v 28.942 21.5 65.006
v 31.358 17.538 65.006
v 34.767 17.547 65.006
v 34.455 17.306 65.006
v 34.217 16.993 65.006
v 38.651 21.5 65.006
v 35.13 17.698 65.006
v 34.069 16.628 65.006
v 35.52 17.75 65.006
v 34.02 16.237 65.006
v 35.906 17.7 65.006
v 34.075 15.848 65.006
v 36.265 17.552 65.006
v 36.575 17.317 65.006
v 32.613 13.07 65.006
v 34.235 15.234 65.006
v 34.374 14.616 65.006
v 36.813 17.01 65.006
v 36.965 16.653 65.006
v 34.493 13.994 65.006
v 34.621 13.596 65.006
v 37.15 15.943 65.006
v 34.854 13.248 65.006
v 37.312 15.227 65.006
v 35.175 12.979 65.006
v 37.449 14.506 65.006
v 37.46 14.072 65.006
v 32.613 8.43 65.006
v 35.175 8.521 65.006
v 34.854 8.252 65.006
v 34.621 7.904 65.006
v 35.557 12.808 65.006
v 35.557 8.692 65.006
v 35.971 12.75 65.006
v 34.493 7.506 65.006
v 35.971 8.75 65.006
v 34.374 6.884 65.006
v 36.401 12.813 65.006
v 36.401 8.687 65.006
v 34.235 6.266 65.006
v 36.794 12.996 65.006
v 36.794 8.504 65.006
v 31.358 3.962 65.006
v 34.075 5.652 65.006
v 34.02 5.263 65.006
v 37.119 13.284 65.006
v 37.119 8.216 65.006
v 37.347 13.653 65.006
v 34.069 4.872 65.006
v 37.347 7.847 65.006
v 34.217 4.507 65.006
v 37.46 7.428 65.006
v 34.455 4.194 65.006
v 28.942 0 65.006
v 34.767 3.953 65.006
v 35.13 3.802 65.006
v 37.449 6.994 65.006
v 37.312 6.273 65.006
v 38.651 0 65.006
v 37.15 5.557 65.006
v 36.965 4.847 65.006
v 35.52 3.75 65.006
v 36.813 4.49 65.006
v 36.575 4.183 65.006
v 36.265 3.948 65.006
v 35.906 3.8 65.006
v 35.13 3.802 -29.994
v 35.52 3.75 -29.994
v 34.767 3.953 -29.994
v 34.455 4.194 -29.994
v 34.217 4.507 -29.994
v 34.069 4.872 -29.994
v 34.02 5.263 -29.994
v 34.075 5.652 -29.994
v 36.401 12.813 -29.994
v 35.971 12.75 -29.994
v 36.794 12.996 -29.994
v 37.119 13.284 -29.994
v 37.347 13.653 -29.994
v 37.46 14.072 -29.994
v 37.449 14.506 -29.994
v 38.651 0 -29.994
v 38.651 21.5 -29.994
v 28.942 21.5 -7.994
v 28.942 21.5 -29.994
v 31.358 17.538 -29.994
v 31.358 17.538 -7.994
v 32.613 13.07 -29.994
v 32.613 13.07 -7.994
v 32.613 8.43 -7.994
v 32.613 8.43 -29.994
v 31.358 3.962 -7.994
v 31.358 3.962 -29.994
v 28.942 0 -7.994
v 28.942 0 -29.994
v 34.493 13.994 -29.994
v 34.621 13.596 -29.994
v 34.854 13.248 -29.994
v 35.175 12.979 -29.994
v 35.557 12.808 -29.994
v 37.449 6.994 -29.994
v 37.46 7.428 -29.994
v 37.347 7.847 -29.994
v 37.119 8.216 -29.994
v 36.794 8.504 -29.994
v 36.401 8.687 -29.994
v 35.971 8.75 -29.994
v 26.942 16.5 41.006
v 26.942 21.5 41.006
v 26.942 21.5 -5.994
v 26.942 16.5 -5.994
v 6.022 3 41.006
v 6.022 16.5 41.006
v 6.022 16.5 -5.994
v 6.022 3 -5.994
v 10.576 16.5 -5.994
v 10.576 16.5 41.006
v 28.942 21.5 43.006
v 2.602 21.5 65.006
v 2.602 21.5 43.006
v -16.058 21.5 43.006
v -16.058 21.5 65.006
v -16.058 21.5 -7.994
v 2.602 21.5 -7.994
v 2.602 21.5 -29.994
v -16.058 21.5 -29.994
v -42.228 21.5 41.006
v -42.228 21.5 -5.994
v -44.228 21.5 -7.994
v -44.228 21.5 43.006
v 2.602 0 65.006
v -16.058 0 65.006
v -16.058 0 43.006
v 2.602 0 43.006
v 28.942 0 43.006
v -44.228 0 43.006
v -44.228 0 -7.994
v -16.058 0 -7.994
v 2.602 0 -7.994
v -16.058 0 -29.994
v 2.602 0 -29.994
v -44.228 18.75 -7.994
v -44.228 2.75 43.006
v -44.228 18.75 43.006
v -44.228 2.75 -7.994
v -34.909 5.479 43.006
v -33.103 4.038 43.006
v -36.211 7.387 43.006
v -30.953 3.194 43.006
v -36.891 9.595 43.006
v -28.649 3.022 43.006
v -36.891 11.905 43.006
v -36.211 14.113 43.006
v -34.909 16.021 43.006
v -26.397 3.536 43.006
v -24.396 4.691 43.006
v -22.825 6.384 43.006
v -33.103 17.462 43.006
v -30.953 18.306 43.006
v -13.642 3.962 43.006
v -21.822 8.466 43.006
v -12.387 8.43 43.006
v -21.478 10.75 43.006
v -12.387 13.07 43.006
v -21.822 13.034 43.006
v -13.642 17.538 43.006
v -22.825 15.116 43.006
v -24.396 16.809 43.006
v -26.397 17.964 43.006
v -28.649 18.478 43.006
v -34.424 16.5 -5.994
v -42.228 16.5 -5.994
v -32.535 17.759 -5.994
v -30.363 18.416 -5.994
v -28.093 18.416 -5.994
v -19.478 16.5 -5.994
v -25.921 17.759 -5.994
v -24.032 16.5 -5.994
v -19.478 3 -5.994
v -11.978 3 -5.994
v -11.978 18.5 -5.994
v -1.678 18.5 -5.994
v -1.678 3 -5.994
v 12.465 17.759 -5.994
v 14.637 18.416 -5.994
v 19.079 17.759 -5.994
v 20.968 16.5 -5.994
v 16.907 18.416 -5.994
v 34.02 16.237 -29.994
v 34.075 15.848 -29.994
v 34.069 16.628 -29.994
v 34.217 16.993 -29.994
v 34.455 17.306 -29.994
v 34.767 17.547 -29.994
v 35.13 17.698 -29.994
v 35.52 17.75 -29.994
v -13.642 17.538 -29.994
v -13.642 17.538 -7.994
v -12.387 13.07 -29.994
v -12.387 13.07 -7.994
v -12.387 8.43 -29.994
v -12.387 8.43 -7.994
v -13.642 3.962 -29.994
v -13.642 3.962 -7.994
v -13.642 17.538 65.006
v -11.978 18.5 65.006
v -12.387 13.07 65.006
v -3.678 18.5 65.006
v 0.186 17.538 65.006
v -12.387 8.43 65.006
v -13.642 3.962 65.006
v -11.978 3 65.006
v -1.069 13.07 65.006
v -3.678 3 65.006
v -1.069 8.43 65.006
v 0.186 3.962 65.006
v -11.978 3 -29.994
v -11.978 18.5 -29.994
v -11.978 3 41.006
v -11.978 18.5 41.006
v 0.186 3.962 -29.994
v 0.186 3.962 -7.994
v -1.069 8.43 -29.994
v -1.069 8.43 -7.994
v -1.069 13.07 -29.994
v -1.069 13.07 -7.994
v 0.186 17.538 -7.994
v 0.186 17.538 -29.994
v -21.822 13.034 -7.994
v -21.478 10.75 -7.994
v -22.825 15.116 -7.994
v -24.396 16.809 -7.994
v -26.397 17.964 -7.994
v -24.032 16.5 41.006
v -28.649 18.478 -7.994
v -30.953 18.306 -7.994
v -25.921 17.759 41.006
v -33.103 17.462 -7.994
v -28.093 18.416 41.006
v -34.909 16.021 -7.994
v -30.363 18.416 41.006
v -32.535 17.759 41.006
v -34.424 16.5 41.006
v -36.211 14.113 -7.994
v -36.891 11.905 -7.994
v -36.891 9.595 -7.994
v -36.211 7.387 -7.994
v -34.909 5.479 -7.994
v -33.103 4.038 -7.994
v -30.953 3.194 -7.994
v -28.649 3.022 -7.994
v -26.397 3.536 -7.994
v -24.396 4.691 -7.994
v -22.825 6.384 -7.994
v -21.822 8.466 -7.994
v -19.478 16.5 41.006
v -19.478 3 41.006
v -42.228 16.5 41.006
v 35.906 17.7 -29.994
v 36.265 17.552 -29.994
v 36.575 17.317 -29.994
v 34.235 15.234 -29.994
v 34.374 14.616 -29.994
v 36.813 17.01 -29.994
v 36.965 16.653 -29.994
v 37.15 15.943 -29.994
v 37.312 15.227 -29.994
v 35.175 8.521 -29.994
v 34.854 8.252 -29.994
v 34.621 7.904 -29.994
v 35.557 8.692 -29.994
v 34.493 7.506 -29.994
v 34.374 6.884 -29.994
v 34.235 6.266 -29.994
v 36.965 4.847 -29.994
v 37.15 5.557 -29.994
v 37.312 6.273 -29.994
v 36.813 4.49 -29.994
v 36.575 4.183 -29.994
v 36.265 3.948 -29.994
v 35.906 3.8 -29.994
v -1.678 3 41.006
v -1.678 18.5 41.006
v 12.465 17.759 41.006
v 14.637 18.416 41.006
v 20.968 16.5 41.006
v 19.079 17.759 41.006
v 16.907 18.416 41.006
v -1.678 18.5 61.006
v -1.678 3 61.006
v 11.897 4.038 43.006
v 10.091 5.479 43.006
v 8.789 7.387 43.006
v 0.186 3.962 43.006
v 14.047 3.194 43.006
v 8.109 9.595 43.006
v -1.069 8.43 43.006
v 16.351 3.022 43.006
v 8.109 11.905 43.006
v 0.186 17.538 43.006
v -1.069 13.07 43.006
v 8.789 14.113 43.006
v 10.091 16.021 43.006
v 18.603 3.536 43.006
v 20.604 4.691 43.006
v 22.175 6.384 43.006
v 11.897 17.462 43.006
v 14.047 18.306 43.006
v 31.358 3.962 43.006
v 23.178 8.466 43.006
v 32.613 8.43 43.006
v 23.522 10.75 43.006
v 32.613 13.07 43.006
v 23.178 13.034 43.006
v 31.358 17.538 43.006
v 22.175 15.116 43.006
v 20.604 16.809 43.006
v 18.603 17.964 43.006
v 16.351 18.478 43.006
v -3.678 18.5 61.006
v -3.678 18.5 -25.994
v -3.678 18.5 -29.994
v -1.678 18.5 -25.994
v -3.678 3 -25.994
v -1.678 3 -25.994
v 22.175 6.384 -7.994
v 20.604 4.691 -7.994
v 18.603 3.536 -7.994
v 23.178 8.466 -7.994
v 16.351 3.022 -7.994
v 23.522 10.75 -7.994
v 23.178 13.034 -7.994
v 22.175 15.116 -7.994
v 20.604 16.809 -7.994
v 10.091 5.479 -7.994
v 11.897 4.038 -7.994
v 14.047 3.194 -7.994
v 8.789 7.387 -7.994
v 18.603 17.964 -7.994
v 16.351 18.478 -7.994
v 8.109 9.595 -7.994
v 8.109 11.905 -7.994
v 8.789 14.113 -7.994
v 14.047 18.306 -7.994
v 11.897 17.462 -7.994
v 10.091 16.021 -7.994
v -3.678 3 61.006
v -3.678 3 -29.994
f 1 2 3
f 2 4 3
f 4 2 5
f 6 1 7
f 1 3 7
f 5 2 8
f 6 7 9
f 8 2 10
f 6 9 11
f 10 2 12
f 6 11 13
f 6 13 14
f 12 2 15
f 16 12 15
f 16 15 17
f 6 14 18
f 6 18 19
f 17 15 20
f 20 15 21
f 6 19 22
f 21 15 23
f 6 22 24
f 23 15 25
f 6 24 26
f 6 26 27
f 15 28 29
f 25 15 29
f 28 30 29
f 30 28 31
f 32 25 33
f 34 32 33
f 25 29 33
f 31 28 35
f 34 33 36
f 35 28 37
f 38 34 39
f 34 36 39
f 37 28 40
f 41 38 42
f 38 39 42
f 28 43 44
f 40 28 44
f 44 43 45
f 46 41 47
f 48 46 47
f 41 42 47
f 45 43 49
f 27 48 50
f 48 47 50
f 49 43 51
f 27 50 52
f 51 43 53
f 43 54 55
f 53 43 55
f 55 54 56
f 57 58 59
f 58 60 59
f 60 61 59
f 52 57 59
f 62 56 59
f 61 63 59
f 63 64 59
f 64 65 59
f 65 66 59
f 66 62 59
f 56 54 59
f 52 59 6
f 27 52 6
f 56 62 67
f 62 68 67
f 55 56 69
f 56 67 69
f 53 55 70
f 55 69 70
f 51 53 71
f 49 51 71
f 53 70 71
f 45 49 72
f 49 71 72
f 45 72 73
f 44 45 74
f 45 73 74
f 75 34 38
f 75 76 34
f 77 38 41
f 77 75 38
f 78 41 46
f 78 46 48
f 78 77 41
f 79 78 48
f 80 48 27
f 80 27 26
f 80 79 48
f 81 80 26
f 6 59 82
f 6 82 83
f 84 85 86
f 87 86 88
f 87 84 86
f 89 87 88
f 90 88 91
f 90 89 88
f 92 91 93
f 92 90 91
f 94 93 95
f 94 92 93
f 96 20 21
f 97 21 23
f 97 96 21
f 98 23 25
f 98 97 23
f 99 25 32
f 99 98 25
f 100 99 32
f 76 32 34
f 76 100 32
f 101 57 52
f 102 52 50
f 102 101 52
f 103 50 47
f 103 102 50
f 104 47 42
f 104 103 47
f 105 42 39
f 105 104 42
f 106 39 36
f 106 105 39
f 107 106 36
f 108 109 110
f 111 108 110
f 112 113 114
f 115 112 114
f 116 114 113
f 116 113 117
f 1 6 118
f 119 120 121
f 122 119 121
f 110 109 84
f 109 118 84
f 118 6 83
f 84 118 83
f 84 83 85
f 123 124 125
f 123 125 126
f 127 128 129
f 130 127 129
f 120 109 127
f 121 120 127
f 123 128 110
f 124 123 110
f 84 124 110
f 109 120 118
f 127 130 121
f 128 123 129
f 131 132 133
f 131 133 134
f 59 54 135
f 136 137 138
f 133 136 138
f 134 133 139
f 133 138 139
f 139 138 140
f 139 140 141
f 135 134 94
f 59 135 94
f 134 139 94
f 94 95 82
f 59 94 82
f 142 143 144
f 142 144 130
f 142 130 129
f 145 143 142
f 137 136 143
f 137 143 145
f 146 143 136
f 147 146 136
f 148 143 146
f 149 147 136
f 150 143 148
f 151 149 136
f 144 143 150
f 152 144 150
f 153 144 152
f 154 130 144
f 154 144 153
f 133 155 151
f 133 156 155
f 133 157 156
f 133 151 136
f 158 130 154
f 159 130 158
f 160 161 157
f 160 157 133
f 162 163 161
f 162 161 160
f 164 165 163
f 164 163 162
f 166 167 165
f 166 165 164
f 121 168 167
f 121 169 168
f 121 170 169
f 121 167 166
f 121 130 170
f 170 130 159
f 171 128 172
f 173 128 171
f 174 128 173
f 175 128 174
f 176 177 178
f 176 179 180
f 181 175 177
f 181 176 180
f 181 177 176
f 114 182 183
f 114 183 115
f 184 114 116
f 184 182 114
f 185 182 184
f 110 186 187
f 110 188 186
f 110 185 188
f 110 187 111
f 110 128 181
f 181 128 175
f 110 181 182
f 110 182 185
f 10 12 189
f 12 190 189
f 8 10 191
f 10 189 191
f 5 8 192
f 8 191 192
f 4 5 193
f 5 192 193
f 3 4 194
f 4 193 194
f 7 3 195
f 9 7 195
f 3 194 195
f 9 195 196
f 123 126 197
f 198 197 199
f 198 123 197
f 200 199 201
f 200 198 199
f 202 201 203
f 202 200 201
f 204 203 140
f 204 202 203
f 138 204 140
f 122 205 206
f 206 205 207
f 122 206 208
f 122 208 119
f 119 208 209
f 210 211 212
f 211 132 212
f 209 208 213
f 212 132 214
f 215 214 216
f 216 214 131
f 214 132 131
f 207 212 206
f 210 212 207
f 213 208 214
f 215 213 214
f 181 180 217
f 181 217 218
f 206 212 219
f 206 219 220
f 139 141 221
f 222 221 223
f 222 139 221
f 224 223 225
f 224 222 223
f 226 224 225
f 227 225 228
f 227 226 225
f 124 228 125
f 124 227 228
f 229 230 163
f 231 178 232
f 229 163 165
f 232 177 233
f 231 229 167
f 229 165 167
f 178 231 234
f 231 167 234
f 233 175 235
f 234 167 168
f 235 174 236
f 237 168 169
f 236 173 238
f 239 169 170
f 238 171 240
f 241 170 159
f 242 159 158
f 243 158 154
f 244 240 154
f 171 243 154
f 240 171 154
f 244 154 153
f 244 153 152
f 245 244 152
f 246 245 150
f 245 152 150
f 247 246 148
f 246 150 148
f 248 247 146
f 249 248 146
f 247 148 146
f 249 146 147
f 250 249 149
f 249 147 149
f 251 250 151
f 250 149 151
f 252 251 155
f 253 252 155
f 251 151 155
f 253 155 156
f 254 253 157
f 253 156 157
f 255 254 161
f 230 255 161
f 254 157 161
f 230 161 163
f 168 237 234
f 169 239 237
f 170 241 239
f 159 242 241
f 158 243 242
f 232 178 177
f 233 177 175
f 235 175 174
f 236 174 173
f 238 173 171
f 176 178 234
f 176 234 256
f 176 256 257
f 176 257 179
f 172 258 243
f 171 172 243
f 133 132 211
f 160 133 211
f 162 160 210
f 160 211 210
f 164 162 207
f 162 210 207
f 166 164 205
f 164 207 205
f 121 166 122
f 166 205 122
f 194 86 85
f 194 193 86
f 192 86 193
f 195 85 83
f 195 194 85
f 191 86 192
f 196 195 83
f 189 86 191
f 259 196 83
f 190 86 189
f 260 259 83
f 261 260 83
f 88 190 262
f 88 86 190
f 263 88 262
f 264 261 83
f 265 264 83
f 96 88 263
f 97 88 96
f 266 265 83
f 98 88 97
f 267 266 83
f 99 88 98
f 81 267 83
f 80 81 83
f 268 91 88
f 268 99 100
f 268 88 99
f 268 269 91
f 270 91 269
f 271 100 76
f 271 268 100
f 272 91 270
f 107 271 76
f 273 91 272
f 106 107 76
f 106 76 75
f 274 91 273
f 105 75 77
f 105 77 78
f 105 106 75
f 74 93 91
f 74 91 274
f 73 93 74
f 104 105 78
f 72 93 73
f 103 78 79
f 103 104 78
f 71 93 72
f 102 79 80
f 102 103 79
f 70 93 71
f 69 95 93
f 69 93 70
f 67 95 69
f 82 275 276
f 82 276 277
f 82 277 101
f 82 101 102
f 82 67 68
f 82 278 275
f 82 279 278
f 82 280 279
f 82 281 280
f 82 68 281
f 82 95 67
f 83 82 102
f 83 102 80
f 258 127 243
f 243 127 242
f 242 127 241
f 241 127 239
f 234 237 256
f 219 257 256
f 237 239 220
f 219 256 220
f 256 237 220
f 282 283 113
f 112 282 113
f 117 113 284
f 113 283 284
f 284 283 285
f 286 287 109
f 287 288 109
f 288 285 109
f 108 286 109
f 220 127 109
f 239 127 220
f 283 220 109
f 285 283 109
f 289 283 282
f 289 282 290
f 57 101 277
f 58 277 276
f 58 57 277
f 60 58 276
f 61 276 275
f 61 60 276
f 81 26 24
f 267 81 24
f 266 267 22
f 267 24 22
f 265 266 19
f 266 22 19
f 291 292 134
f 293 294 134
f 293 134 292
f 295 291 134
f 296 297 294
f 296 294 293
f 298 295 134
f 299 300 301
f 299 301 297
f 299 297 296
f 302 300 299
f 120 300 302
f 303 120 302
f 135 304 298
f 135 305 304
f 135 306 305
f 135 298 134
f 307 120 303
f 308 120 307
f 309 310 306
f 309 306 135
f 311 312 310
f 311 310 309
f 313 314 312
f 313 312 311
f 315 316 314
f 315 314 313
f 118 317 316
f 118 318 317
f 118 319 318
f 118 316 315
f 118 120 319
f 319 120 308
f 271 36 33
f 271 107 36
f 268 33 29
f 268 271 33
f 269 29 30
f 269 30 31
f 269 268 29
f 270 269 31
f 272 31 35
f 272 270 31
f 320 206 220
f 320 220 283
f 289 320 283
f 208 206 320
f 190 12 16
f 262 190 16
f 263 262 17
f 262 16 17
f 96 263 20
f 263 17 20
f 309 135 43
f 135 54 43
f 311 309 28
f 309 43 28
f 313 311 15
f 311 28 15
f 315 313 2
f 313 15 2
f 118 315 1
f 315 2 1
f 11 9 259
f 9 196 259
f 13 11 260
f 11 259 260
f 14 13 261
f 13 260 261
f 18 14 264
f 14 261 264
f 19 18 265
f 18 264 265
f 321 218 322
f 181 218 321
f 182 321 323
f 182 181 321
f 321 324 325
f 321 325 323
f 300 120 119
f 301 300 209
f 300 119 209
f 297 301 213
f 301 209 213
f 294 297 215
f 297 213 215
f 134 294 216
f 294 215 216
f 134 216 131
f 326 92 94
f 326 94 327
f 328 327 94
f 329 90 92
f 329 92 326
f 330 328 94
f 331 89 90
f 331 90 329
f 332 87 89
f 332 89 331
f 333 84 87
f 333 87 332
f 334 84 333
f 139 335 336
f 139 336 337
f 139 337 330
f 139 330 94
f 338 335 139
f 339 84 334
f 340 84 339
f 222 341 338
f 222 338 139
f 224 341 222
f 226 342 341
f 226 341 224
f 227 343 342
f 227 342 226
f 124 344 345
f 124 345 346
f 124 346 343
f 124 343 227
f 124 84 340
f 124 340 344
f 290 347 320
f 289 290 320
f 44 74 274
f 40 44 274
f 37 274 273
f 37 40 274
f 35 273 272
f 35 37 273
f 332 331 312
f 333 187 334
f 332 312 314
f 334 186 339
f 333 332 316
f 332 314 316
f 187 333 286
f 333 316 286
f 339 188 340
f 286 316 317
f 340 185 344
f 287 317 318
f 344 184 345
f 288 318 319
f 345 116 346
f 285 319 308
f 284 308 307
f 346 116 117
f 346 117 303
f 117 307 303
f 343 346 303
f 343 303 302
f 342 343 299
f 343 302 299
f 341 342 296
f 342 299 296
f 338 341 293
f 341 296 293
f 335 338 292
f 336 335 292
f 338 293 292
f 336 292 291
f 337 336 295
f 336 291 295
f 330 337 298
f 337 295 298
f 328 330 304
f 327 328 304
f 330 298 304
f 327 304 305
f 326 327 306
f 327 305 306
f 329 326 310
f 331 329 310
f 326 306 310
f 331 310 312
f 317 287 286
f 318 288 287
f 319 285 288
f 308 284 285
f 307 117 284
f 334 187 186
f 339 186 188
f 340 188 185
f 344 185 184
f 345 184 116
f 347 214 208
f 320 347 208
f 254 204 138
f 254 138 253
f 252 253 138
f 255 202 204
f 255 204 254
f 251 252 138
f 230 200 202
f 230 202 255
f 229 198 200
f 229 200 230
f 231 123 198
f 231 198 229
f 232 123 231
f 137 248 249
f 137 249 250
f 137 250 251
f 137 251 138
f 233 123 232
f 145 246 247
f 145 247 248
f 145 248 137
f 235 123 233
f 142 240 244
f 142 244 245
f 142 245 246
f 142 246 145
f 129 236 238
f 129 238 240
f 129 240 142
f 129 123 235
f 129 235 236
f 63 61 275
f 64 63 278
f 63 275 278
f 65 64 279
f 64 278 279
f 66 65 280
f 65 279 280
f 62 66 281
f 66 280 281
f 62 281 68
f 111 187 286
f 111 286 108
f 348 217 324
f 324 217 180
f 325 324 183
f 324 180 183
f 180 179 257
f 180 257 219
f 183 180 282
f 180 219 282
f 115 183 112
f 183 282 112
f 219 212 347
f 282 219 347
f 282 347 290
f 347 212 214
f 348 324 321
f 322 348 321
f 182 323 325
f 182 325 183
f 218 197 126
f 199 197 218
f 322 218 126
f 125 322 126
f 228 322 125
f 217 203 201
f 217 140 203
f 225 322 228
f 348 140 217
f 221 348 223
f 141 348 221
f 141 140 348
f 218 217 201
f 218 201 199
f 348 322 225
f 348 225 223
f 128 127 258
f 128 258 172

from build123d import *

# Parameters (mm, degrees)
SKETCH1_W           = 95
SKETCH1_H           = 95
BOSS_EXTRUDE1_DEPTH = 25
SKETCH2_R           = 7.75
CUT_EXTRUDE2_DEPTH  = 100
SKETCH3_R           = 17
CUT_EXTRUDE3_DEPTH  = 22
CUT_EXTRUDE4_START  = -22
SKETCH4_R           = 17
CUT_EXTRUDE4_DEPTH  = 22
SKETCH5_W           = 6.246993927
SKETCH5_H           = 25
CUT_EXTRUDE5_DEPTH  = 22
SKETCH6_W           = 7.178723585
SKETCH6_H           = 25
CUT_EXTRUDE6_DEPTH  = 22
SKETCH8_W           = 99.503929421
SKETCH8_H           = 3.5
CUT_EXTRUDE7_DEPTH  = 100
SKETCH9_W           = 8.3
SKETCH9_H           = 15.5
CUT_EXTRUDE11_DEPTH = 100
SKETCH13_W          = 87
SKETCH13_H          = 15.5
CUT_EXTRUDE12_DEPTH = 2
SKETCH14_W          = 25.5
SKETCH14_H          = 47
CUT_EXTRUDE14_DEPTH = 18.5
SKETCH16_W          = 24.75
SKETCH16_H          = 47
CUT_EXTRUDE15_DEPTH = 5
SKETCH17_W          = 20.919567191
SKETCH17_H          = 47
CUT_EXTRUDE16_DEPTH = 5
CUT_EXTRUDE17_DEPTH = 100
FILLET6_R           = 1.5
FILLET7_R           = 1.5
FILLET8_R           = 1.5
FILLET9_R           = 1.5
SKETCH19_W          = 12.12120401
SKETCH19_H          = 21.5
CUT_EXTRUDE20_DEPTH = 100


with BuildPart() as part:
    # Sketch1 → Boss-Extrude1 (new body)
    with BuildSketch(Plane(origin=(0, 0, 0), x_dir=(1, 0, 0), z_dir=(0, 1, 0))):
        with Locations((3.271948822, -17.506298191)):
            Rectangle(SKETCH1_W, SKETCH1_H)
    extrude(amount=BOSS_EXTRUDE1_DEPTH)

    # Sketch2 → Cut-Extrude2 (cut)
    with BuildSketch(Plane.XY.offset(65.006298191)):
        with Locations((-29.228051178, 10.75)):
            Circle(SKETCH2_R)
        with Locations((15.771948822, 10.75)):
            Circle(SKETCH2_R)
    extrude(amount=-CUT_EXTRUDE2_DEPTH, mode=Mode.SUBTRACT)

    # Sketch3 → Cut-Extrude3 (cut)
    with BuildSketch(Plane.XY.offset(65.006298191)):
        with Locations((-29.228051178, 10.75)):
            Circle(SKETCH3_R)
        with Locations((15.771948822, 10.75)):
            Circle(SKETCH3_R)
    extrude(amount=-CUT_EXTRUDE3_DEPTH, mode=Mode.SUBTRACT)

    # Sketch4 → Cut-Extrude4 (cut)
    with BuildSketch(Plane(origin=(0, 0, -29.993701809), x_dir=(-1, 0, 0), z_dir=(0, 0, -1)).offset(CUT_EXTRUDE4_START)):
        with Locations((-15.771948822, 10.75)):
            Circle(SKETCH4_R)
        with Locations((29.228051178, 10.75)):
            Circle(SKETCH4_R)
    extrude(amount=CUT_EXTRUDE4_DEPTH, mode=Mode.SUBTRACT)

    # Sketch5 → Cut-Extrude5 (cut)
    with BuildSketch(Plane.XY.offset(65.006298191)):
        with Locations((-41.104554214, 12.5)):
            Rectangle(SKETCH5_W, SKETCH5_H)
    extrude(amount=-CUT_EXTRUDE5_DEPTH, mode=Mode.SUBTRACT)

    # Sketch6 → Cut-Extrude6 (cut)
    with BuildSketch(Plane(origin=(0, 0, -29.993701809), x_dir=(-1, 0, 0), z_dir=(0, 0, -1))):
        with Locations((40.638689386, 12.5)):
            Rectangle(SKETCH6_W, SKETCH6_H)
    extrude(amount=-CUT_EXTRUDE6_DEPTH, mode=Mode.SUBTRACT)

    # Sketch8 → Cut-Extrude7 (cut)
    with BuildSketch(Plane(origin=(0, 0, -29.993701809), x_dir=(-1, 0, 0), z_dir=(0, 0, -1))):
        with Locations((-1.019984112, 23.25)):
            Rectangle(SKETCH8_W, SKETCH8_H)
    extrude(amount=-CUT_EXTRUDE7_DEPTH, mode=Mode.SUBTRACT)

    # Sketch9 → Cut-Extrude11 (cut)
    with BuildSketch(Plane.XY.offset(65.006298191)):
        with Locations((-7.828051178, 10.75)):
            Rectangle(SKETCH9_W, SKETCH9_H)
    extrude(amount=-CUT_EXTRUDE11_DEPTH, mode=Mode.SUBTRACT)

    # Sketch13 → Cut-Extrude12 (cut)
    with BuildSketch(Plane.ZY.offset(3.678051178)):
        with Locations((17.506298191, 10.75)):
            Rectangle(SKETCH13_W, SKETCH13_H)
    extrude(amount=-CUT_EXTRUDE12_DEPTH, mode=Mode.SUBTRACT)

    # Sketch14 → Cut-Extrude14 (cut)
    with BuildSketch(Plane(origin=(0, 21.5, 0), x_dir=(1, 0, 0), z_dir=(0, 1, 0))):
        with Locations((-6.728051178, -17.506298191)):
            Rectangle(SKETCH14_W, SKETCH14_H)
    extrude(amount=-CUT_EXTRUDE14_DEPTH, mode=Mode.SUBTRACT)

    # Sketch16 → Cut-Extrude15 (cut)
    with BuildSketch(Plane(origin=(0, 21.5, 0), x_dir=(1, 0, 0), z_dir=(0, 1, 0))):
        with Locations((-29.853051178, -17.506298191)):
            Rectangle(SKETCH16_W, SKETCH16_H)
    extrude(amount=-CUT_EXTRUDE15_DEPTH, mode=Mode.SUBTRACT)

    # Sketch17 → Cut-Extrude16 (cut)
    with BuildSketch(Plane(origin=(0, 21.5, 0), x_dir=(1, 0, 0), z_dir=(0, 1, 0))):
        with Locations((16.481732418, -17.506298191)):
            Rectangle(SKETCH17_W, SKETCH17_H)
    extrude(amount=-CUT_EXTRUDE16_DEPTH, mode=Mode.SUBTRACT)

    # Sketch18 → Cut-Extrude17 (cut)
    with BuildSketch(Plane.XY.offset(65.006298191)):
        with BuildLine():
            Line((34.66639245, 12.75), (37.680851122, 12.75))
            ThreePointArc((37.680851122, 12.75), (37.300376381, 15.28065192), (36.628602437, 17.75))
            Line((36.628602437, 17.75), (33.435470555, 17.75))
            ThreePointArc((33.435470555, 17.75), (34.221100776, 15.291893017), (34.66639245, 12.75))
        make_face()
        with BuildLine():
            Line((34.66639245, 8.75), (37.680851122, 8.75))
            ThreePointArc((37.680851122, 8.75), (37.300376381, 6.21934808), (36.628602437, 3.75))
            Line((36.628602437, 3.75), (33.435470555, 3.75))
            ThreePointArc((33.435470555, 3.75), (34.221100776, 6.208106983), (34.66639245, 8.75))
        make_face()
    extrude(amount=-CUT_EXTRUDE17_DEPTH, mode=Mode.SUBTRACT)

    # Fillet6
    fillet6_edges = [part.edges().sort_by_distance(p)[0] for p in [
        (33.435470555, 17.75, 17.506298191),
        (36.628602437, 17.75, 17.506298191),
    ]]
    fillet(fillet6_edges, radius=FILLET6_R - 0.0001)  # a hair under: the kernel refuses the full size

    # Fillet7
    fillet7_edges = [part.edges().sort_by_distance(p)[0] for p in [
        (37.680851122, 12.75, 17.506298191),
        (34.66639245, 12.75, 17.506298191),
    ]]
    fillet(fillet7_edges, radius=FILLET7_R - 0.0001)  # a hair under: the kernel refuses the full size

    # Fillet8
    fillet8_edges = [part.edges().sort_by_distance(p)[0] for p in [
        (33.435470555, 3.75, 17.506298191),
        (36.628602437, 3.75, 17.506298191),
    ]]
    fillet(fillet8_edges, radius=FILLET8_R - 0.0001)  # a hair under: the kernel refuses the full size

    # Fillet9
    fillet9_edges = [part.edges().sort_by_distance(p)[0] for p in [
        (37.680851122, 8.75, 17.506298191),
        (34.66639245, 8.75, 17.506298191),
    ]]
    fillet(fillet9_edges, radius=FILLET9_R - 0.0001)  # a hair under: the kernel refuses the full size

    # Sketch19 → Cut-Extrude20 (cut)
    with BuildSketch(Plane.XY.offset(65.006298191)):
        with Locations((44.711346817, 10.75)):
            Rectangle(SKETCH19_W, SKETCH19_H)
    extrude(amount=-CUT_EXTRUDE20_DEPTH, mode=Mode.SUBTRACT)


solid = part.part
